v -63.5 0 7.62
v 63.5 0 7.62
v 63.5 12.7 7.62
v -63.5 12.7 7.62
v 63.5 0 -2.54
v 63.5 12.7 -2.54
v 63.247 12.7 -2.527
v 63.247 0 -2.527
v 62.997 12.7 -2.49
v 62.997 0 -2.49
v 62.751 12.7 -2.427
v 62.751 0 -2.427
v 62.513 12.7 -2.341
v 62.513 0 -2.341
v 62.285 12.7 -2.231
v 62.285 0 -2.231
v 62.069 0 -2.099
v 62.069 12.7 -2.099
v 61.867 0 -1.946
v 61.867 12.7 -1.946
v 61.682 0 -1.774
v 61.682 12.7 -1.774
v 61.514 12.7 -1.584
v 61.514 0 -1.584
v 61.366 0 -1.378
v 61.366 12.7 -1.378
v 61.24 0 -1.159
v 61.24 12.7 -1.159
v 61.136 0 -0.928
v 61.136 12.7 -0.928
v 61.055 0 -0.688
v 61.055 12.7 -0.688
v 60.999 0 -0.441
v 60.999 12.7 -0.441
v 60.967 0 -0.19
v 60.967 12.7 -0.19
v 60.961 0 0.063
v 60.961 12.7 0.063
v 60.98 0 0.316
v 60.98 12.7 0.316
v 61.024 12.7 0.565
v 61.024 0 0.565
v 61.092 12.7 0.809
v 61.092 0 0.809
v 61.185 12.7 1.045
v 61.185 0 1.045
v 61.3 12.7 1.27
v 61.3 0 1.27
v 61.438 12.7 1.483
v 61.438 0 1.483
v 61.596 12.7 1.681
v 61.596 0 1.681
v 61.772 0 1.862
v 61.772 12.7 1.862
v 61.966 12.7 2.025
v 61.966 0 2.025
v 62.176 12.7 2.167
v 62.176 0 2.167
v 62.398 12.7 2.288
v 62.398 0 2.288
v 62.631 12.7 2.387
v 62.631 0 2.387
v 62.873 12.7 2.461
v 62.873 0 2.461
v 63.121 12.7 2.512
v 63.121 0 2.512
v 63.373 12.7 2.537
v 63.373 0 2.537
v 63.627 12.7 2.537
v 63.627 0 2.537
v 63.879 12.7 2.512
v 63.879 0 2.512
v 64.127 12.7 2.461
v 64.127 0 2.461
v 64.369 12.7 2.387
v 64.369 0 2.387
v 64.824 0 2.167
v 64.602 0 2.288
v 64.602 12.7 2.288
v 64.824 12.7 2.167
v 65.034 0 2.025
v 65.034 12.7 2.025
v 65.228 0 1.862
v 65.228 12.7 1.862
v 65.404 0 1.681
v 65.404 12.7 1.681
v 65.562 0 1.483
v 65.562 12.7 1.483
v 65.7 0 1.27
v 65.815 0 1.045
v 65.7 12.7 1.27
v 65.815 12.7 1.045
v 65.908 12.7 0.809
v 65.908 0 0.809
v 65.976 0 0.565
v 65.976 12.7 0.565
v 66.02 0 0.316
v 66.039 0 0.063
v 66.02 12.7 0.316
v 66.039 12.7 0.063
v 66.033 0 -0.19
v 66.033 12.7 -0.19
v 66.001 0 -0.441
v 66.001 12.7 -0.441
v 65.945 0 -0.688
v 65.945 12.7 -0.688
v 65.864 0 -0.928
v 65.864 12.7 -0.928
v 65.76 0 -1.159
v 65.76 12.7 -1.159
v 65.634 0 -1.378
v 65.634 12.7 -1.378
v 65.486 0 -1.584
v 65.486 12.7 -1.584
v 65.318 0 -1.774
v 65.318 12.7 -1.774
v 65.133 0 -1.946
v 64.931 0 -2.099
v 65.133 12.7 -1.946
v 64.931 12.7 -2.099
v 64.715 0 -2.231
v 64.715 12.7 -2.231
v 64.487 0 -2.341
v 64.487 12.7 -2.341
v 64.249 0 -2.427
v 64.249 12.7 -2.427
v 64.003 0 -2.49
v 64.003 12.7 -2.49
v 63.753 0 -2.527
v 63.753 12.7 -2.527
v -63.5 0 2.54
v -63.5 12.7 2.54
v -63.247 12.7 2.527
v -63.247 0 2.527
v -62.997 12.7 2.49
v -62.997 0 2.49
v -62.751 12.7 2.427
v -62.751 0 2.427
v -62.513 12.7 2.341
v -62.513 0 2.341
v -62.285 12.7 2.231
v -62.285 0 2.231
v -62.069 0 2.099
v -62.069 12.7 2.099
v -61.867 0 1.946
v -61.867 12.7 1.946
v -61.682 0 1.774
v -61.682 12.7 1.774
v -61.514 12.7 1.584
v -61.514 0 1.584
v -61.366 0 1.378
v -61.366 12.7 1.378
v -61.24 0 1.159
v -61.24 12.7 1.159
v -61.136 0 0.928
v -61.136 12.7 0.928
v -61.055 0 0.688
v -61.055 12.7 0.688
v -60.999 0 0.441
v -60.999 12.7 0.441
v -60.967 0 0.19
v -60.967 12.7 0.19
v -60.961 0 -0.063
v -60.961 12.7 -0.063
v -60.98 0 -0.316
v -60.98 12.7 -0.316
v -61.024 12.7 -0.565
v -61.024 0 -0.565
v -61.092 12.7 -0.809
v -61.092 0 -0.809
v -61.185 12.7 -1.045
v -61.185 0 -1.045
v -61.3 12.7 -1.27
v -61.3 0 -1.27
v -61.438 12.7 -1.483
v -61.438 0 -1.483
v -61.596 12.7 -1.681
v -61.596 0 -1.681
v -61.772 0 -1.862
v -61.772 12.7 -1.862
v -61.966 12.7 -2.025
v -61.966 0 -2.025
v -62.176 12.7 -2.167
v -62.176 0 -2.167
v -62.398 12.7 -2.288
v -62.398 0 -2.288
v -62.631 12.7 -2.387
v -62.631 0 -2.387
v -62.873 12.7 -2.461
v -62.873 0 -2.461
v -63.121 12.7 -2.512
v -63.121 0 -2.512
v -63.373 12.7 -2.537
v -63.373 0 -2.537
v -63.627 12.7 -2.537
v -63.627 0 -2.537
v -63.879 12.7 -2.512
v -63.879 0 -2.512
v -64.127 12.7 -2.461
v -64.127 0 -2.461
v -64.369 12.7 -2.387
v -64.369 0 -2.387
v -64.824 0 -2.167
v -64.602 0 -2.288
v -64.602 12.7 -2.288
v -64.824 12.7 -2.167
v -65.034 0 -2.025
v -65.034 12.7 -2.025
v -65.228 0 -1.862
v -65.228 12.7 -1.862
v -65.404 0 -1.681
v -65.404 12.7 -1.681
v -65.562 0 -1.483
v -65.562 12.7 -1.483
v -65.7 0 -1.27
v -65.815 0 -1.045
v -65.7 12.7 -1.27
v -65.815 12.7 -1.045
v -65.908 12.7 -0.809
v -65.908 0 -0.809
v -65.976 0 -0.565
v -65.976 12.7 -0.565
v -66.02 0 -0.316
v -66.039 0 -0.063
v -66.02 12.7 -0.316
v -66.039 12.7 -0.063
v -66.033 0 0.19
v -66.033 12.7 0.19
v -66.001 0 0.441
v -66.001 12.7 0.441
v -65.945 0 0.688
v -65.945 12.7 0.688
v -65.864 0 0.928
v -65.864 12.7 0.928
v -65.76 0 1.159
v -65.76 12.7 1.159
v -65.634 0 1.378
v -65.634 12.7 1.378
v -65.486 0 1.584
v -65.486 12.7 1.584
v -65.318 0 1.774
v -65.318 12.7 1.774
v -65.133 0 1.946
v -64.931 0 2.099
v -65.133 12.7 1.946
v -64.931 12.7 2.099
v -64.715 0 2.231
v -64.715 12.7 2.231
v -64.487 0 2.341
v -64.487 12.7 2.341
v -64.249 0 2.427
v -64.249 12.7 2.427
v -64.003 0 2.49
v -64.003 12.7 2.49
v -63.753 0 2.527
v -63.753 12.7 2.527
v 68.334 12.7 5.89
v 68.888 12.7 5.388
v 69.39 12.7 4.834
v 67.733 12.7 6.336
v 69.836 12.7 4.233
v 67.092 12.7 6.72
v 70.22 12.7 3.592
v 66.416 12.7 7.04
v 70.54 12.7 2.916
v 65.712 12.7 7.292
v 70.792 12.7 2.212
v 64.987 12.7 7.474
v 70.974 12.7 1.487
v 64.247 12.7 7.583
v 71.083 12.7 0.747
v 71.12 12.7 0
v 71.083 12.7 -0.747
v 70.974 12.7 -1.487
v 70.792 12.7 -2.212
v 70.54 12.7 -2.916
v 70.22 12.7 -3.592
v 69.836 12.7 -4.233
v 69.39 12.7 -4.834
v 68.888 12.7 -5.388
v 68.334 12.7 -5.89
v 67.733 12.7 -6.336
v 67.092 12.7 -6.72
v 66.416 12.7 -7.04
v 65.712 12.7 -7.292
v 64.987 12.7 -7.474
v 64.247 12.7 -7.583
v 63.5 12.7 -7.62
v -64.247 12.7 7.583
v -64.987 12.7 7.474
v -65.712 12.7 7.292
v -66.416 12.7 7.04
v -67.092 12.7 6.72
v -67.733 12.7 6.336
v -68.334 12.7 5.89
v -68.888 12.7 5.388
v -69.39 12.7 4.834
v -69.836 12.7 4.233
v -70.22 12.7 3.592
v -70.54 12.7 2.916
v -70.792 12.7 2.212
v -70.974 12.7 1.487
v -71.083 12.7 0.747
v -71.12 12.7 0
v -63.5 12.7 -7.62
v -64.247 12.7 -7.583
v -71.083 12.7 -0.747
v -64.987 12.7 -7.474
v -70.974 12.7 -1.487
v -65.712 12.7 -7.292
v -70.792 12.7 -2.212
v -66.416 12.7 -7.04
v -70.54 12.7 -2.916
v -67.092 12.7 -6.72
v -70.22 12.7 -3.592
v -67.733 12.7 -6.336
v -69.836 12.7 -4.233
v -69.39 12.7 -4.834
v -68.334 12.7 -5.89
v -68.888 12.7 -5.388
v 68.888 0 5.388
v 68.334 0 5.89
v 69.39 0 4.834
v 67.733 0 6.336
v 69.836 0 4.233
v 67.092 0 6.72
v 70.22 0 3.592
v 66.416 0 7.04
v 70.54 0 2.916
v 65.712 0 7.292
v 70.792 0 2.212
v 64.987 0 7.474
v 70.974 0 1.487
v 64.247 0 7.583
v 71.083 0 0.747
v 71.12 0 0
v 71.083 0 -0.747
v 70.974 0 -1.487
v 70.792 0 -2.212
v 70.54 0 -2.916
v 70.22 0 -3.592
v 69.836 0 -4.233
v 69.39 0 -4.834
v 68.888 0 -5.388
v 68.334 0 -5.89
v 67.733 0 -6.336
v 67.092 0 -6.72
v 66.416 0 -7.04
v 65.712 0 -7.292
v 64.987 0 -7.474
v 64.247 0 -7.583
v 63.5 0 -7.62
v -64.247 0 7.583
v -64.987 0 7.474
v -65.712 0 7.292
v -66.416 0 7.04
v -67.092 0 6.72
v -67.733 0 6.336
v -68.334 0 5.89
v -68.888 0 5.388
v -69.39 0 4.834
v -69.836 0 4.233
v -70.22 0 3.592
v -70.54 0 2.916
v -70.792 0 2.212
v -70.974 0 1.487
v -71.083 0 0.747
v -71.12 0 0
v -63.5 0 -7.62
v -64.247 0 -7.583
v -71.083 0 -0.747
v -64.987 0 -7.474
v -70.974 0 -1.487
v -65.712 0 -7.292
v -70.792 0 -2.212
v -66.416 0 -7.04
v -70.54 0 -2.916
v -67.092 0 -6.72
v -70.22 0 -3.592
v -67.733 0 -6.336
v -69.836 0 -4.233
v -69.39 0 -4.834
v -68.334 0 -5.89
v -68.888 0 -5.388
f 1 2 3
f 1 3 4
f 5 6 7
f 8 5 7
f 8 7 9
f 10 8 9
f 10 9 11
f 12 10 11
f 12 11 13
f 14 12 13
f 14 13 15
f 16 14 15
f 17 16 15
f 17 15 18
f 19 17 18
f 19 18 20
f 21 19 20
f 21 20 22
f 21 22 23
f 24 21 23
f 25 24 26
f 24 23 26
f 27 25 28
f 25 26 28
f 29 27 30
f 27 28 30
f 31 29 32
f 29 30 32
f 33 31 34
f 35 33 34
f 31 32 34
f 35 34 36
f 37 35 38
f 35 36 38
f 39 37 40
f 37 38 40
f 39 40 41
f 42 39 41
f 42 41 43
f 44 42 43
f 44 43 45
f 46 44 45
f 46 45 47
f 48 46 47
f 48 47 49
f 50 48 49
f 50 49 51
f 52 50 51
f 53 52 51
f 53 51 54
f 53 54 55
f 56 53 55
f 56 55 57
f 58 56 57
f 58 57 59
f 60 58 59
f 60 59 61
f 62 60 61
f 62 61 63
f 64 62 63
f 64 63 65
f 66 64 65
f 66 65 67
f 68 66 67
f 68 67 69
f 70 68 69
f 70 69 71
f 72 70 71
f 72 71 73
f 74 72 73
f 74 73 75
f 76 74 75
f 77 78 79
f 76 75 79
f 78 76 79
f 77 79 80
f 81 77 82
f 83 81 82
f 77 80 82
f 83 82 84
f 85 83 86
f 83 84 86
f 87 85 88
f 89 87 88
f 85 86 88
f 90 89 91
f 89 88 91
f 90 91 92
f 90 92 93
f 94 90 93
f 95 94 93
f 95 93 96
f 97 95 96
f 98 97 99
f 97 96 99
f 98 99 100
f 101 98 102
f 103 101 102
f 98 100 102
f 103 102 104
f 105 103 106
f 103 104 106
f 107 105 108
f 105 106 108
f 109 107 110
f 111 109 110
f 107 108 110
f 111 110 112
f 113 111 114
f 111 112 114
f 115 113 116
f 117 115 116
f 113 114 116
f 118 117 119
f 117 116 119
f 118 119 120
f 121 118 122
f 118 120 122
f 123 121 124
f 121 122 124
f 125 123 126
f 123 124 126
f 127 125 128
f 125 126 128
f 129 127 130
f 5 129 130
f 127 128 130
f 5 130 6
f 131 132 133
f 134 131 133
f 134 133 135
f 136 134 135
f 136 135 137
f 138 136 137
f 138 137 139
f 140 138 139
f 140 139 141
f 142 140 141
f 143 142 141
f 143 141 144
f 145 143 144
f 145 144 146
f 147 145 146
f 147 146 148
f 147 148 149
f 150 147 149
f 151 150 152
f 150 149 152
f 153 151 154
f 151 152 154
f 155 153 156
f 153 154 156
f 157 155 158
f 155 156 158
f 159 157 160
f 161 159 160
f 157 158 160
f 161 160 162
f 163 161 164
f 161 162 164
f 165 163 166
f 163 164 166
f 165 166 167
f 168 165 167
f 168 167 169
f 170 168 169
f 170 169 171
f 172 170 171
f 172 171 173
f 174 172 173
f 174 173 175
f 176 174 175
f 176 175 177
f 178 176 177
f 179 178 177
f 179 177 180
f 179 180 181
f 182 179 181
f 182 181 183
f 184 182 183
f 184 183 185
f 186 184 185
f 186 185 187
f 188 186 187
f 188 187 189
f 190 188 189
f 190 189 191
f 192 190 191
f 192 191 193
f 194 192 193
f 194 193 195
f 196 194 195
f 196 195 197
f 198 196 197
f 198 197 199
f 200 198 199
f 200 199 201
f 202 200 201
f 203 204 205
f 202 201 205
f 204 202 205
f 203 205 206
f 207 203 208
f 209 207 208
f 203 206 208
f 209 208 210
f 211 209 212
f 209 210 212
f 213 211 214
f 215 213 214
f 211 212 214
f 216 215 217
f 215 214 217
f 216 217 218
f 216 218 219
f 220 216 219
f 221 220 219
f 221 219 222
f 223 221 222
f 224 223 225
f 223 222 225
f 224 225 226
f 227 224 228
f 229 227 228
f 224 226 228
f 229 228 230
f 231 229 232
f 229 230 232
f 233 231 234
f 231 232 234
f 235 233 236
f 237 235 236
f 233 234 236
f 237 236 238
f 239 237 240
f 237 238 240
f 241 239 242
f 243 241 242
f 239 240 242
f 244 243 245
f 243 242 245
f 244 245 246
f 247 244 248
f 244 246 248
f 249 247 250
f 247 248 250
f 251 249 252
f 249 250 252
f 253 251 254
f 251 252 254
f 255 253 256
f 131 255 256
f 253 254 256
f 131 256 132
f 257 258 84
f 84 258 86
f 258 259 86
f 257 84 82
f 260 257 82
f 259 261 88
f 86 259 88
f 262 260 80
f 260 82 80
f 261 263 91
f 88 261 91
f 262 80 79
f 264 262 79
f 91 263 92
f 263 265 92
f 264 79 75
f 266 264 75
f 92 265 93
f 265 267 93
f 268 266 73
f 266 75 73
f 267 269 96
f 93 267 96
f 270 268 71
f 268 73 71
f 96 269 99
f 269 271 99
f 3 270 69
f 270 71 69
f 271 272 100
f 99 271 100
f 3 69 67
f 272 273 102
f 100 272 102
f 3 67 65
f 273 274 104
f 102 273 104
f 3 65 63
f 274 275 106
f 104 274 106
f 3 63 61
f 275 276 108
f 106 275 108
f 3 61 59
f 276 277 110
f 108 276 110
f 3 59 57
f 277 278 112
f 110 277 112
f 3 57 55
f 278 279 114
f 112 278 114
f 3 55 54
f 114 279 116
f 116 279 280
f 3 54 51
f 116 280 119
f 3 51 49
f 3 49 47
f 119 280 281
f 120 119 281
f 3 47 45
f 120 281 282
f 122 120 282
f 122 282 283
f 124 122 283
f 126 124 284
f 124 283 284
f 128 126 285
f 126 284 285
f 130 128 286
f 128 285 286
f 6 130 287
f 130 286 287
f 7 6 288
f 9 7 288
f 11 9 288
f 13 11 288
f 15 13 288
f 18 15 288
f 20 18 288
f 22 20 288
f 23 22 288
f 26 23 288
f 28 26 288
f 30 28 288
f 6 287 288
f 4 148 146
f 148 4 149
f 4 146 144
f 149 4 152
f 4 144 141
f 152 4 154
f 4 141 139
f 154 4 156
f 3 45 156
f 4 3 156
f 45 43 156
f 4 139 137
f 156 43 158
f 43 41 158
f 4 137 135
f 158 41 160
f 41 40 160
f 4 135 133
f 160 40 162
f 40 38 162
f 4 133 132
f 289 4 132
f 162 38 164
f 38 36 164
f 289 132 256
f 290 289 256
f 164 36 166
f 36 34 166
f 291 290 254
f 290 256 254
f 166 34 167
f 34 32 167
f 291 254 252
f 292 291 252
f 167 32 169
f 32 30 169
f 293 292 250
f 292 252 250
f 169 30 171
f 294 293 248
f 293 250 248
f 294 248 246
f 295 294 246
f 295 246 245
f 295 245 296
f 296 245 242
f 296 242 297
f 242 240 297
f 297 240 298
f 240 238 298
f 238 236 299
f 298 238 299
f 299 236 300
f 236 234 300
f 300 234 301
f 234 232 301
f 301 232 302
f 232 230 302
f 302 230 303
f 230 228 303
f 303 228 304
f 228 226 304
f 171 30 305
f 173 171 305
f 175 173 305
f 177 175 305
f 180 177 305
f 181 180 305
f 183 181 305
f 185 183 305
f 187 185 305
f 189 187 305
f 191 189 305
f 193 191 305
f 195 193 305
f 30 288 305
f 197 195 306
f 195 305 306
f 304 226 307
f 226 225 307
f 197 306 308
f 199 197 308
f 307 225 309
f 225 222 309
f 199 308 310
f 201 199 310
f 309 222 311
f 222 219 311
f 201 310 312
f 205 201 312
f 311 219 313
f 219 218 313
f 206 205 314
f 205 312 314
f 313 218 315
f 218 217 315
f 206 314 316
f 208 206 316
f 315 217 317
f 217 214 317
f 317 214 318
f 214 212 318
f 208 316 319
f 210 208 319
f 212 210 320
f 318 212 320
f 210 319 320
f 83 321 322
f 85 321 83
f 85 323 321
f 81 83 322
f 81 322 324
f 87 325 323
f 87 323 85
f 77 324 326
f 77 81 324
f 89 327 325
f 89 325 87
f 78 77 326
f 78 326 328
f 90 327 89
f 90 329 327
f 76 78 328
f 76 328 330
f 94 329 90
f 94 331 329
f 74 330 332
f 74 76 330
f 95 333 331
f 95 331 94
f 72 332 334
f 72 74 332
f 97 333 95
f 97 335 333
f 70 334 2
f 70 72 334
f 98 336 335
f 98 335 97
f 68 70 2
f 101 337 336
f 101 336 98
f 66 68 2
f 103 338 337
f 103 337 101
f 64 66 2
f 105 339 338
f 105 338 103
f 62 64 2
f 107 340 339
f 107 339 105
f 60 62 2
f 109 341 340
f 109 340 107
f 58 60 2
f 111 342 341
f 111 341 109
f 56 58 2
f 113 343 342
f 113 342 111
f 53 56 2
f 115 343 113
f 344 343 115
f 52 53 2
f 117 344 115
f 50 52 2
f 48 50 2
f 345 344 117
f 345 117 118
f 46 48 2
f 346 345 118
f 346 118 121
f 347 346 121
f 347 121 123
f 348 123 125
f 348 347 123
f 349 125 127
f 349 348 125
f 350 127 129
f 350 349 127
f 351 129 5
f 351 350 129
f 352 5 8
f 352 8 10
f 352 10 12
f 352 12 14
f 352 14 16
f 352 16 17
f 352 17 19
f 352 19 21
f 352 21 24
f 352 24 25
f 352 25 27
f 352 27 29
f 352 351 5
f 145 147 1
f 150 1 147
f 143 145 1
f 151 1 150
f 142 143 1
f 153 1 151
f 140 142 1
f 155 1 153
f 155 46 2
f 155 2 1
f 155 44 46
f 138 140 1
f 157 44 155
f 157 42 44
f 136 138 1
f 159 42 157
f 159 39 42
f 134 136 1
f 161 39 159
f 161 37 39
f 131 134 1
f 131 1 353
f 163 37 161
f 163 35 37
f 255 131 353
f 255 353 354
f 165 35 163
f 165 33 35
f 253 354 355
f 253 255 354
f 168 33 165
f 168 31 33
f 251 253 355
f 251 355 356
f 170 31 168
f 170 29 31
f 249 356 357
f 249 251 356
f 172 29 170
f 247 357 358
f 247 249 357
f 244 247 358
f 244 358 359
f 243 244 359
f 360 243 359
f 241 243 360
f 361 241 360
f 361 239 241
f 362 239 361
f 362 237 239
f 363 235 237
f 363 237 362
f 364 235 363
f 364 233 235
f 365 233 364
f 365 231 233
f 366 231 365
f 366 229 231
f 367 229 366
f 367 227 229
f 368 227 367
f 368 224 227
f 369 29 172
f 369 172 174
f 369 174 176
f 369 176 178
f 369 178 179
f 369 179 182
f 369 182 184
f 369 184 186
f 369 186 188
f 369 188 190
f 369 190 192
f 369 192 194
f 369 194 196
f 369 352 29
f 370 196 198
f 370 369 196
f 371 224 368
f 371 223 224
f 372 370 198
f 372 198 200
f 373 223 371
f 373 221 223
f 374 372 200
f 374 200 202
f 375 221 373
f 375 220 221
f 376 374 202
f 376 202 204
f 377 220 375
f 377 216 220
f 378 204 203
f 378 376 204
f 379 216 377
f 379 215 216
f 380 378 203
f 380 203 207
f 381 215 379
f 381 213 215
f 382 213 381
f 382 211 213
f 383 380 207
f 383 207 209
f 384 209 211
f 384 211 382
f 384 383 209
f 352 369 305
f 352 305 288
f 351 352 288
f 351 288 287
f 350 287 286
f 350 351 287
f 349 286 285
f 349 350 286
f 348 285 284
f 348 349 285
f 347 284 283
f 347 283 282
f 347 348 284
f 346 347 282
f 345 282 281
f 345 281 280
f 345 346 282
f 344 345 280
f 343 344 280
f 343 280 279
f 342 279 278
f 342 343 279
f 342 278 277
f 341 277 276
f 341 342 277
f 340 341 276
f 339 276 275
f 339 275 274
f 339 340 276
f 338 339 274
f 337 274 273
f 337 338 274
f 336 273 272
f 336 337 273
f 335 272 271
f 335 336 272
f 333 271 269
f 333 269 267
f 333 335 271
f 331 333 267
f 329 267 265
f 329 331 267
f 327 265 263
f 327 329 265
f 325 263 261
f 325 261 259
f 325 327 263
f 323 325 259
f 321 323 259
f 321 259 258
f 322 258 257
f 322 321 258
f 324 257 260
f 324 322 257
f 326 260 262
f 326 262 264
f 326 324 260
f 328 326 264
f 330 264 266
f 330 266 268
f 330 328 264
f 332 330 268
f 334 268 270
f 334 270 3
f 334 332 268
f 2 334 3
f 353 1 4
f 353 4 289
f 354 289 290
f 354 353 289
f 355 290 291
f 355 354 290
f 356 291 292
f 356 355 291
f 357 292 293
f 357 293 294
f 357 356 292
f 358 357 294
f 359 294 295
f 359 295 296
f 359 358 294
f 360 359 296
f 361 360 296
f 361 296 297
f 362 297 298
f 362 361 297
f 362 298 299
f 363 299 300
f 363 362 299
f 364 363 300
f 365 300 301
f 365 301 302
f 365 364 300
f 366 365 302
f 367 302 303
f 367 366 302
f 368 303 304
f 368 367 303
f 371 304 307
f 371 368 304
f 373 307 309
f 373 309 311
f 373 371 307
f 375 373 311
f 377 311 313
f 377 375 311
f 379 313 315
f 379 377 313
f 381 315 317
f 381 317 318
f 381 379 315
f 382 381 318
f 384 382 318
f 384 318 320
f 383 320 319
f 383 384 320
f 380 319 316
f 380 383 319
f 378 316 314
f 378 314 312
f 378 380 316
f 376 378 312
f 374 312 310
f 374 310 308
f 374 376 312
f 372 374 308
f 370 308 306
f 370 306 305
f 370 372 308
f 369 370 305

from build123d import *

# Parameters (mm, degrees)
BOSS_EXTRUDE1_DEPTH = 12.7
SKETCH4_R           = 2.54
CUT_EXTRUDE3_DEPTH  = 73.645776202


with BuildPart() as part:
    # Sketch3 → Boss-Extrude1 (new body)
    with BuildSketch(Plane(origin=(0, 0, 0), x_dir=(1, 0, 0), z_dir=(0, 1, 0))):
        with BuildLine():
            Line((-63.5, 7.62), (63.5, 7.62))
            ThreePointArc((63.5, 7.62), (71.12, 0), (63.5, -7.62))
            Line((63.5, -7.62), (-63.5, -7.62))
            ThreePointArc((-63.5, -7.62), (-71.12, 0), (-63.5, 7.62))
        make_face()
    extrude(amount=BOSS_EXTRUDE1_DEPTH)

    # Sketch4 → Cut-Extrude3 (cut, through all)
    with BuildSketch(Plane(origin=(0, 12.7, 0), x_dir=(1, 0, 0), z_dir=(0, 1, 0))):
        with Locations(Location((-63.5, 0, 0), (0, 0, 270))):
            Circle(SKETCH4_R)
        with Locations(Location((63.5, 0, 0), (0, 0, 90))):
            Circle(SKETCH4_R)
    extrude(amount=-CUT_EXTRUDE3_DEPTH, mode=Mode.SUBTRACT)


solid = part.part
